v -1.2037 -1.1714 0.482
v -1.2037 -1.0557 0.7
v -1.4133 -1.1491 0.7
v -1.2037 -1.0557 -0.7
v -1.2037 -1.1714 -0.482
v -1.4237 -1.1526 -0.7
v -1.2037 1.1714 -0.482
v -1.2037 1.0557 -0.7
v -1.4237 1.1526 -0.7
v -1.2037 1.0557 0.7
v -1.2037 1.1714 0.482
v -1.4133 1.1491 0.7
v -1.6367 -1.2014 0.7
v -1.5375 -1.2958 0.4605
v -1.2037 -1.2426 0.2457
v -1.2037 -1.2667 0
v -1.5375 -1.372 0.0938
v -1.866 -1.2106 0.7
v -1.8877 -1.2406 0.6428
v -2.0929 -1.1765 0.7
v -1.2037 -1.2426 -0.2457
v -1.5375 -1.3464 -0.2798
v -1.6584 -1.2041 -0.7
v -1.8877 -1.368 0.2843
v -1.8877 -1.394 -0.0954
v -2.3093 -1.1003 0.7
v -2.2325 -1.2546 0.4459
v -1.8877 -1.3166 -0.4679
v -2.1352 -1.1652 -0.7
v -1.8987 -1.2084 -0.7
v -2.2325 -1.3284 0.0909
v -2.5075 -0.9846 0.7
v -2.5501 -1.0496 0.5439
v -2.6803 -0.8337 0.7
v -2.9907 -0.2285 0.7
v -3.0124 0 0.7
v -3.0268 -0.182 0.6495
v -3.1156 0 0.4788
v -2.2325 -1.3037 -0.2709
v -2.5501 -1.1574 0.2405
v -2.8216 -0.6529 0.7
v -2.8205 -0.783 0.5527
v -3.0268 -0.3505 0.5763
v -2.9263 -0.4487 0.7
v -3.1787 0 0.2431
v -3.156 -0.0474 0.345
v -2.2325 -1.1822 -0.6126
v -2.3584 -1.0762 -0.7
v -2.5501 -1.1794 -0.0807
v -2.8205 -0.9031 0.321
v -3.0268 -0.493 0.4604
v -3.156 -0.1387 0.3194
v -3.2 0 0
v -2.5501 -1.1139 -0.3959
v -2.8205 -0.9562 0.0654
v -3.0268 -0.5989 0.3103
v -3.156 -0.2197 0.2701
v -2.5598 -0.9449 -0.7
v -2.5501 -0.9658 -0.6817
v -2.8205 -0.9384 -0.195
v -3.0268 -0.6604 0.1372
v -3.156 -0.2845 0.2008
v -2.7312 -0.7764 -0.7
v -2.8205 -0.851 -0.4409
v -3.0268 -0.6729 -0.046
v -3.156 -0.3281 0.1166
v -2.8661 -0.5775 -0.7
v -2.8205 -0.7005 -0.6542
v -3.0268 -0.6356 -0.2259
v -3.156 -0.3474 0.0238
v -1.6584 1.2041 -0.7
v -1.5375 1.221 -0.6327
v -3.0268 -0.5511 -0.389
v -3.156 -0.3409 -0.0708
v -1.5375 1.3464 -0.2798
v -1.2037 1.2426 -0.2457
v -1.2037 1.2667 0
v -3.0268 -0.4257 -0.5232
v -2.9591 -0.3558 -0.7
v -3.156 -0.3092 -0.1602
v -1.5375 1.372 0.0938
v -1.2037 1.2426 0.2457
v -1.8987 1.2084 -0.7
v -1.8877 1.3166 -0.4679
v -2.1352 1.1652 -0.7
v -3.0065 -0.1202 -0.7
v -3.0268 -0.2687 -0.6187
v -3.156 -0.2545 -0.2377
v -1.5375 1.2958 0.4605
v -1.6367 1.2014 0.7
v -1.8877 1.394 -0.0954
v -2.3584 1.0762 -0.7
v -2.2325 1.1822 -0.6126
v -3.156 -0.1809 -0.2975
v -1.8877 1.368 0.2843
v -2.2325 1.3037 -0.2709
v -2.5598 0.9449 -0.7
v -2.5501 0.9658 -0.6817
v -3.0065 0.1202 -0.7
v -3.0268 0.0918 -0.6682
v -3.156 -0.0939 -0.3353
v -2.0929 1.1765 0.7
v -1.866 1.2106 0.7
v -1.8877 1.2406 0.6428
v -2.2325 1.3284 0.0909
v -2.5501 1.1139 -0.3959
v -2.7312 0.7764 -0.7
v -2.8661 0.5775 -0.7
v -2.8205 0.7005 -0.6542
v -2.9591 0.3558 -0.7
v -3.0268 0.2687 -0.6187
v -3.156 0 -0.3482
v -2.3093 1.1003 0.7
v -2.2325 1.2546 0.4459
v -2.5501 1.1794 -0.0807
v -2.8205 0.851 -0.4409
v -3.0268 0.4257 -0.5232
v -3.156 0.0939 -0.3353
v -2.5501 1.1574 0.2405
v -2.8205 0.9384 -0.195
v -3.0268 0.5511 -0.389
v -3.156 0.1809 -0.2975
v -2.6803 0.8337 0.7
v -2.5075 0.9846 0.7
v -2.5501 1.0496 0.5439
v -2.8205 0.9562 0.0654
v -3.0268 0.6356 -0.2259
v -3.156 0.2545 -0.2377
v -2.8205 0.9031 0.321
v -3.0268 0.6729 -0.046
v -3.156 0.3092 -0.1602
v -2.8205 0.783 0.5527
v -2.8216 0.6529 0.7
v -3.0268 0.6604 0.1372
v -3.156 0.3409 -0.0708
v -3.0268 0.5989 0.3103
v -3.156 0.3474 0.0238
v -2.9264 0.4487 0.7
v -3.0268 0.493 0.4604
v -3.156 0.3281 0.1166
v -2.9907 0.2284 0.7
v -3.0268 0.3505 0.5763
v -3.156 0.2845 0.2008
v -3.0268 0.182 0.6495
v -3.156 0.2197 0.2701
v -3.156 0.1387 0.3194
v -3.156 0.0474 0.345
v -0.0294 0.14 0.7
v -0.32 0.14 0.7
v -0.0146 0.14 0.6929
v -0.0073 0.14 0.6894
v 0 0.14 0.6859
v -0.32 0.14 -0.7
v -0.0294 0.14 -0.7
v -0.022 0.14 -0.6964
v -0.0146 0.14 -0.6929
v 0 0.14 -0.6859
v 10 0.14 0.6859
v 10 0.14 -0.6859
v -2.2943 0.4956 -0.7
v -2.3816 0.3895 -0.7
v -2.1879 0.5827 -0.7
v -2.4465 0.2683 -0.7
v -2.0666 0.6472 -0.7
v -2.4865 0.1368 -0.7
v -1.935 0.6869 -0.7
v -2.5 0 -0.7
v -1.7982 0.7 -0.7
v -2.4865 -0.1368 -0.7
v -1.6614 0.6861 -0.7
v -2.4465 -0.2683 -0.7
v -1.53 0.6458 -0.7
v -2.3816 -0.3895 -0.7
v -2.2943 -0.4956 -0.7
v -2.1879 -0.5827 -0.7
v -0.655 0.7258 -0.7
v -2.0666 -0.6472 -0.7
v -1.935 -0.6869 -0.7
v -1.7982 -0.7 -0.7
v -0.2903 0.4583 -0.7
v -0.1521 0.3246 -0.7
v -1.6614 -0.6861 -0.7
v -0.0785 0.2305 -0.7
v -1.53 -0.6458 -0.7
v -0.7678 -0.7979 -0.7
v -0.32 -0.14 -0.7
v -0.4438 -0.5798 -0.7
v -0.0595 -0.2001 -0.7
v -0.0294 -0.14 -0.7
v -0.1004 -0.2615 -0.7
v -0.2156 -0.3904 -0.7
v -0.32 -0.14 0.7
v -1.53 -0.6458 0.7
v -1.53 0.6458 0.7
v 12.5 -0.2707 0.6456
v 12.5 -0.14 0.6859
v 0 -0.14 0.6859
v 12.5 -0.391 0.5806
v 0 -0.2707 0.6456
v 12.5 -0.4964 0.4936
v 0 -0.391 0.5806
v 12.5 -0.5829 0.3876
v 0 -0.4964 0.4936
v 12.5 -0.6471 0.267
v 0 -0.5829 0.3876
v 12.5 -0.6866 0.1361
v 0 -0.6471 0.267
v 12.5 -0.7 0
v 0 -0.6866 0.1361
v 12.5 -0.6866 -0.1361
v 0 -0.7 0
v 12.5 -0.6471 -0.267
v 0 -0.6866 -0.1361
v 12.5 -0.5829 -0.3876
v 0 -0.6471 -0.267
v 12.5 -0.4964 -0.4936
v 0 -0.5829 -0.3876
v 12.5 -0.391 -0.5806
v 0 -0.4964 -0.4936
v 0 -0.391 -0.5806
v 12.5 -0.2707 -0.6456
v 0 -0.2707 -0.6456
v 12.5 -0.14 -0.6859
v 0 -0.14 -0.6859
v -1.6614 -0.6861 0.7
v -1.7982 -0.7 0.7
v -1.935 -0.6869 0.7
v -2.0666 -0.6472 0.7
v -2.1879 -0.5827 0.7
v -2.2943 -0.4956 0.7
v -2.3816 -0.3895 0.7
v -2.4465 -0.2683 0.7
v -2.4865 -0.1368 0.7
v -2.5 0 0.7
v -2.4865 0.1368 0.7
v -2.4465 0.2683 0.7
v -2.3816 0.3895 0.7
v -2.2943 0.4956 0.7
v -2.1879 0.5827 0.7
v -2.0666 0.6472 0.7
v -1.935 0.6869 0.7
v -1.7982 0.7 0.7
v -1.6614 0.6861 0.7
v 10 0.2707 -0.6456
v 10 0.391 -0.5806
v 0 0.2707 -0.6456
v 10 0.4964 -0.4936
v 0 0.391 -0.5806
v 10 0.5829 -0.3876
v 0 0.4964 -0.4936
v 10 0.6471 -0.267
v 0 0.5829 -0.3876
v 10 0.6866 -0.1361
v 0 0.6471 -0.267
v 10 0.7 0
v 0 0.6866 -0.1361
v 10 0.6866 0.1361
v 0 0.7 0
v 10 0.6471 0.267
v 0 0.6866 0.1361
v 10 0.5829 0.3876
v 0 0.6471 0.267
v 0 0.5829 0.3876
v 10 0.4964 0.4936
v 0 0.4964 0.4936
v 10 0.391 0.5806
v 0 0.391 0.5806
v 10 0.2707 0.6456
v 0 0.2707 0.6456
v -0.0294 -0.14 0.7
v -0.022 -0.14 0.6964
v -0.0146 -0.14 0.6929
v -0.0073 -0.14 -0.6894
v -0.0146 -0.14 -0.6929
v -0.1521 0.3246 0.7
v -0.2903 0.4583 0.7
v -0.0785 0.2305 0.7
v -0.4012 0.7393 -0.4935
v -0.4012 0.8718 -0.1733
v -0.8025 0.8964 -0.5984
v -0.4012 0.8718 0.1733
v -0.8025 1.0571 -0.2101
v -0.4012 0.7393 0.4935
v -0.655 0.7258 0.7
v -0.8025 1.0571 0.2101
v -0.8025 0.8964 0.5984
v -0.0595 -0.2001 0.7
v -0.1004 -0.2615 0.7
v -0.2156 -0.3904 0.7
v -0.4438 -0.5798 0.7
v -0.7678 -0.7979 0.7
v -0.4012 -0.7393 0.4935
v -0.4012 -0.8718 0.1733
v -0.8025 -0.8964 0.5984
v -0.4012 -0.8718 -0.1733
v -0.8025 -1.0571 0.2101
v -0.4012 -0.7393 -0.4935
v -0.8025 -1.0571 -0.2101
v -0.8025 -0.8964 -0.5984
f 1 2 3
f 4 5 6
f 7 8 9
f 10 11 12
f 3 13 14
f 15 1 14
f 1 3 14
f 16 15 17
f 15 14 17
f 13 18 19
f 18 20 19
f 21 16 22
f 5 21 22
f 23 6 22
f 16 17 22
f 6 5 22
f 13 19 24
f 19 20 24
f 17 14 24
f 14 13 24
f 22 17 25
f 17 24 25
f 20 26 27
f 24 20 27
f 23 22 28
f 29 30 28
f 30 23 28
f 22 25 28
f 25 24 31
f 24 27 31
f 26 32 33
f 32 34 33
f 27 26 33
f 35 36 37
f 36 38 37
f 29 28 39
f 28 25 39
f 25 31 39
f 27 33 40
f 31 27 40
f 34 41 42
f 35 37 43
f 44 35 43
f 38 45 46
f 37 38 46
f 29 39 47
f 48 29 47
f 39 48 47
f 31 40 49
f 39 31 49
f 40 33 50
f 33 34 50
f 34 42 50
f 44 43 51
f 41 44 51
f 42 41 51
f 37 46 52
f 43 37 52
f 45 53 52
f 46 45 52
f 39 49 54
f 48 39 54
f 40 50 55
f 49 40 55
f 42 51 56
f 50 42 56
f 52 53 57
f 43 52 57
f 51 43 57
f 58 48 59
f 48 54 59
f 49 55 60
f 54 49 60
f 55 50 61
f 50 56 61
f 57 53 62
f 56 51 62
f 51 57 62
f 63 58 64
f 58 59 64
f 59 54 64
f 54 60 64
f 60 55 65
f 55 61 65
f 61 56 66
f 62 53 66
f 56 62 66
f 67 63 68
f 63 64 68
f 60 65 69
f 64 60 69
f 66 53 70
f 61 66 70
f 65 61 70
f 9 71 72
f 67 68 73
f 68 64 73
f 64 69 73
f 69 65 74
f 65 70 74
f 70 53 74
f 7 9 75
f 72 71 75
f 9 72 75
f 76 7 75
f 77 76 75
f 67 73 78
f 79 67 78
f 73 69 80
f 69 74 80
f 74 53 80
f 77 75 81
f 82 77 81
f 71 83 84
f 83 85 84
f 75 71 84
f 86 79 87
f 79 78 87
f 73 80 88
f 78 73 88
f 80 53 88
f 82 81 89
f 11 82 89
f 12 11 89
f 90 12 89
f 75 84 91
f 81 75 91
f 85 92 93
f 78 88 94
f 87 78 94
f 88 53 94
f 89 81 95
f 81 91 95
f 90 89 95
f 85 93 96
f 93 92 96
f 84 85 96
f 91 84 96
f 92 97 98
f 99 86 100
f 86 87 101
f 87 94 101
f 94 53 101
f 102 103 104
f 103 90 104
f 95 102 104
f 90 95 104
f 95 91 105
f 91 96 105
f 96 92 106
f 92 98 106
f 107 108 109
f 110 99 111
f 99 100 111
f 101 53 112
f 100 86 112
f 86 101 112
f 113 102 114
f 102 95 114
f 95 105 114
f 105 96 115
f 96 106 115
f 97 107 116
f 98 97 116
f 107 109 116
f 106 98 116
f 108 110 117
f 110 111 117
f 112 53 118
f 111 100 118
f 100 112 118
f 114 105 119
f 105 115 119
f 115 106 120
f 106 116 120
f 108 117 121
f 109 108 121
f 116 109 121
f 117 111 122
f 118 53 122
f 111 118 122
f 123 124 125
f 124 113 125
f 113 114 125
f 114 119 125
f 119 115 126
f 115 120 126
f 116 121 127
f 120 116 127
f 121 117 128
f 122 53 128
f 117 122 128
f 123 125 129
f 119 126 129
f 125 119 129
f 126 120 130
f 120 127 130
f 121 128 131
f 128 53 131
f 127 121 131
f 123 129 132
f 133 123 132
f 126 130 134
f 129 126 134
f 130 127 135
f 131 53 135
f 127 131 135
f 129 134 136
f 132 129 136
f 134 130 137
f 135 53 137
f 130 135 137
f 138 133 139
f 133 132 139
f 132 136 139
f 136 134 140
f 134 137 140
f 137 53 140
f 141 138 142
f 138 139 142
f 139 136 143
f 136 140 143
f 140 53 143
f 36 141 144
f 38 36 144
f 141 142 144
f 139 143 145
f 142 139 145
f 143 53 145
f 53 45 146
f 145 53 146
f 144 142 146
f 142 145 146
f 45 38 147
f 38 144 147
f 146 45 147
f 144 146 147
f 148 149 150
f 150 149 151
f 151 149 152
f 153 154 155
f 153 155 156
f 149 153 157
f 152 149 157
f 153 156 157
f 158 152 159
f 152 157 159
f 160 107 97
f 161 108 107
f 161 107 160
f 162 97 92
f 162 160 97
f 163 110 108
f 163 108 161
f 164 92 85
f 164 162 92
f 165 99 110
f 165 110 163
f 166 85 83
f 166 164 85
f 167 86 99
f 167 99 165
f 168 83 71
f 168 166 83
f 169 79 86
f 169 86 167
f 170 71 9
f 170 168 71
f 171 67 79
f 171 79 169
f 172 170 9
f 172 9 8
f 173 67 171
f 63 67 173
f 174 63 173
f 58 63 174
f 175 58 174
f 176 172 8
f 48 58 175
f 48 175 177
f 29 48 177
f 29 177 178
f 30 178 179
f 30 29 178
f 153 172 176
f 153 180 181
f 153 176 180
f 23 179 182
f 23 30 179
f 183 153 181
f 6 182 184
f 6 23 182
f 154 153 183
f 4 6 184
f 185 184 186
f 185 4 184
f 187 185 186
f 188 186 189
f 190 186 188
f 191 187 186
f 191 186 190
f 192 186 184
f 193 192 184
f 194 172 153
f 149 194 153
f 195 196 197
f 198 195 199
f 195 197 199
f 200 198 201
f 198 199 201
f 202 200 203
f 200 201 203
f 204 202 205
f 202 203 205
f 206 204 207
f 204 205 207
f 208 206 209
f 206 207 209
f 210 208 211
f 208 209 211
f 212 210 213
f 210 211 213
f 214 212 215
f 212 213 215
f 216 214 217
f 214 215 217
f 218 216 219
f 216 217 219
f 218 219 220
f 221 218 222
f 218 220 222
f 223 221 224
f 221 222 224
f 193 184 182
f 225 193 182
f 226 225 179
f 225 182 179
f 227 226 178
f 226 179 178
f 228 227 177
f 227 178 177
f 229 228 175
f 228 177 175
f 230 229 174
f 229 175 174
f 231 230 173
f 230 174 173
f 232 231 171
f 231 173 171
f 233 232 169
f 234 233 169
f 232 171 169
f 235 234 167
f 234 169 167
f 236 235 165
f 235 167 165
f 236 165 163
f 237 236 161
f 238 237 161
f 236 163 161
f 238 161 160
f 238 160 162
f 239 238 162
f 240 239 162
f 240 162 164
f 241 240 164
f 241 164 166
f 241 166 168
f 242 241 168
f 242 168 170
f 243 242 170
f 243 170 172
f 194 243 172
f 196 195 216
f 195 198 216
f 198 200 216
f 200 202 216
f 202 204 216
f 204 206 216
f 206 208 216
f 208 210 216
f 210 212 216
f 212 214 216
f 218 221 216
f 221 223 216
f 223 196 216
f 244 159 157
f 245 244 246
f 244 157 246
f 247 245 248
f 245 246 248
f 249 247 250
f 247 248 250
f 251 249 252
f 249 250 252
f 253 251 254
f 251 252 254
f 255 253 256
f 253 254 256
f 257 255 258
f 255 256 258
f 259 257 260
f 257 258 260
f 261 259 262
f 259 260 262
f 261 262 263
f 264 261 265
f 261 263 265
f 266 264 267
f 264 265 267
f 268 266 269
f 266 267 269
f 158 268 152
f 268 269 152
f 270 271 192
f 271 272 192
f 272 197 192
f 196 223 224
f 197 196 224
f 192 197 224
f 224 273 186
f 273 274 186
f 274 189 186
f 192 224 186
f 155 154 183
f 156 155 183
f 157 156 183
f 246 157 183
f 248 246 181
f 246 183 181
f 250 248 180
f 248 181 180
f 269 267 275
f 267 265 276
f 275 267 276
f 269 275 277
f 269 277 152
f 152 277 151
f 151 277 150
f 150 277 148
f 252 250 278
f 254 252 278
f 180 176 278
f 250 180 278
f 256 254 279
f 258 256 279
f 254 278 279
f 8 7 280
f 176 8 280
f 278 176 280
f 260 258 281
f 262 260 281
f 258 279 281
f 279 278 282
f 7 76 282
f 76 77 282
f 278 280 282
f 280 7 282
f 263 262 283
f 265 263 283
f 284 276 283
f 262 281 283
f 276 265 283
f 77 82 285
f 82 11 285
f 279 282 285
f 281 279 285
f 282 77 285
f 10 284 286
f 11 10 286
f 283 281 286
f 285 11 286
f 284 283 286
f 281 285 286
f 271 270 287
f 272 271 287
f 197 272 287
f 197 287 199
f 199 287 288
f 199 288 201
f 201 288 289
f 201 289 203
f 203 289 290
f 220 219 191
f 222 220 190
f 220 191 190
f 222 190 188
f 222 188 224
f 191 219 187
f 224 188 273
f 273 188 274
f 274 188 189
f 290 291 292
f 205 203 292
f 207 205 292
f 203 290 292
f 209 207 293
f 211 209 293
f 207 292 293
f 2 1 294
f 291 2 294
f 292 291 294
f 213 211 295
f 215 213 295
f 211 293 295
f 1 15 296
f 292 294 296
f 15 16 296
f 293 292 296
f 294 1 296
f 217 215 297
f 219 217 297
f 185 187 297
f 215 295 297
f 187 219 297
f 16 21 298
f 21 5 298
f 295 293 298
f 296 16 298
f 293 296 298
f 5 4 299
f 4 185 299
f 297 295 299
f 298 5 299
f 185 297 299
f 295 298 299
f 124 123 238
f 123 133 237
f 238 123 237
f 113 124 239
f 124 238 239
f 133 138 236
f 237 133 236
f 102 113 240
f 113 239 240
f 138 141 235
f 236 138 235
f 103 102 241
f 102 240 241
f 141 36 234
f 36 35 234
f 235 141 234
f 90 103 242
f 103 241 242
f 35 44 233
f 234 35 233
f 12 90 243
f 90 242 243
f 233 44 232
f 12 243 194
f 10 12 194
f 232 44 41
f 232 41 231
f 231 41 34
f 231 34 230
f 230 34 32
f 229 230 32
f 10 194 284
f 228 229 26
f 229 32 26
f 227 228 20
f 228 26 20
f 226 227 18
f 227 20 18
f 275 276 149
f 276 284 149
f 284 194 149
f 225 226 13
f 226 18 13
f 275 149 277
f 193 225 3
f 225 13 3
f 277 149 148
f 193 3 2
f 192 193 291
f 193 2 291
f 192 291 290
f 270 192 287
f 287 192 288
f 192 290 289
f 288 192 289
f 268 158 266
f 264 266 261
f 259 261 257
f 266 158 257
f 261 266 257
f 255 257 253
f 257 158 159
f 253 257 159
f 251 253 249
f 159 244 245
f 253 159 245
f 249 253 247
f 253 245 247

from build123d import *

# Parameters (mm, degrees)
CUT_EXTRUDE1_DEPTH      = 13.655828697
CUT_EXTRUDE1_DEPTH_BACK = 13.655828697
CUT_EXTRUDE2_DEPTH      = 13.597618823
CUT_EXTRUDE2_DEPTH_BACK = 13.597618823


with BuildPart() as part:
    # Sketch1 → Revolve1 (revolve)
    with BuildSketch(Plane.XY, mode=Mode.PRIVATE) as revolve1_sk:
        with BuildLine():
            Line((0, 0.7), (-1.203701126, 1.266660038))
            ThreePointArc((-1.203701126, 1.266660038), (-2.550060523, 1.182120642), (-3.2, 0))
            Line((-3.2, 0), (12.5, 0))
            Line((12.5, 0), (12.5, 0.7))
            Line((12.5, 0.7), (0, 0.7))
        make_face()
    revolve(revolve1_sk.sketch.rotate(Axis((0, 0, 0), (1, 0, 0)), 90), axis=Axis((0, 0, 0), (1, 0, 0)))

    # Sketch2 → Cut-Extrude1 (cut, two sides: drawn at the far end of the back side and taken through both)
    with BuildSketch(Plane(origin=(0, 0, 0), x_dir=(1, 0, 0), z_dir=(0, 1, 0)).offset(-CUT_EXTRUDE1_DEPTH_BACK)):
        with BuildLine():
            Line((-3.012435565, 0.7), (0, 0.7))
            Line((0, 0.7), (-1.203701126, 1.266660038))
            ThreePointArc((-1.203701126, 1.266660038), (-2.218547495, 1.335970806), (-3.012435565, 0.7))
        make_face()
        with BuildLine():
            Line((-3.012435565, -0.7), (0, -0.7))
            Line((0, -0.7), (-1.203701126, -1.266660038))
            ThreePointArc((-1.203701126, -1.266660038), (-2.218547495, -1.335970806), (-3.012435565, -0.7))
        make_face()
    extrude(amount=CUT_EXTRUDE1_DEPTH + CUT_EXTRUDE1_DEPTH_BACK, mode=Mode.SUBTRACT)

    # Sketch3 → Cut-Extrude2 (cut, two sides: drawn at the far end of the back side and taken through both)
    with BuildSketch(Plane.XY.offset(-CUT_EXTRUDE2_DEPTH_BACK)):
        with BuildLine():
            Line((-1.530011672, 0.645837675), (-0.32, 0.14))
            Line((-0.32, 0.14), (10, 0.14))
            Line((10, 0.14), (10, 0.7))
            Line((10, 0.7), (12.5, 0.7))
            Line((12.5, 0.7), (12.5, -0.14))
            Line((12.5, -0.14), (-0.32, -0.14))
            Line((-0.32, -0.14), (-1.530011672, -0.645837675))
            ThreePointArc((-1.530011672, -0.645837675), (-2.5, 0), (-1.530011672, 0.645837675))
        make_face()
    extrude(amount=CUT_EXTRUDE2_DEPTH + CUT_EXTRUDE2_DEPTH_BACK, mode=Mode.SUBTRACT)


solid = part.part
